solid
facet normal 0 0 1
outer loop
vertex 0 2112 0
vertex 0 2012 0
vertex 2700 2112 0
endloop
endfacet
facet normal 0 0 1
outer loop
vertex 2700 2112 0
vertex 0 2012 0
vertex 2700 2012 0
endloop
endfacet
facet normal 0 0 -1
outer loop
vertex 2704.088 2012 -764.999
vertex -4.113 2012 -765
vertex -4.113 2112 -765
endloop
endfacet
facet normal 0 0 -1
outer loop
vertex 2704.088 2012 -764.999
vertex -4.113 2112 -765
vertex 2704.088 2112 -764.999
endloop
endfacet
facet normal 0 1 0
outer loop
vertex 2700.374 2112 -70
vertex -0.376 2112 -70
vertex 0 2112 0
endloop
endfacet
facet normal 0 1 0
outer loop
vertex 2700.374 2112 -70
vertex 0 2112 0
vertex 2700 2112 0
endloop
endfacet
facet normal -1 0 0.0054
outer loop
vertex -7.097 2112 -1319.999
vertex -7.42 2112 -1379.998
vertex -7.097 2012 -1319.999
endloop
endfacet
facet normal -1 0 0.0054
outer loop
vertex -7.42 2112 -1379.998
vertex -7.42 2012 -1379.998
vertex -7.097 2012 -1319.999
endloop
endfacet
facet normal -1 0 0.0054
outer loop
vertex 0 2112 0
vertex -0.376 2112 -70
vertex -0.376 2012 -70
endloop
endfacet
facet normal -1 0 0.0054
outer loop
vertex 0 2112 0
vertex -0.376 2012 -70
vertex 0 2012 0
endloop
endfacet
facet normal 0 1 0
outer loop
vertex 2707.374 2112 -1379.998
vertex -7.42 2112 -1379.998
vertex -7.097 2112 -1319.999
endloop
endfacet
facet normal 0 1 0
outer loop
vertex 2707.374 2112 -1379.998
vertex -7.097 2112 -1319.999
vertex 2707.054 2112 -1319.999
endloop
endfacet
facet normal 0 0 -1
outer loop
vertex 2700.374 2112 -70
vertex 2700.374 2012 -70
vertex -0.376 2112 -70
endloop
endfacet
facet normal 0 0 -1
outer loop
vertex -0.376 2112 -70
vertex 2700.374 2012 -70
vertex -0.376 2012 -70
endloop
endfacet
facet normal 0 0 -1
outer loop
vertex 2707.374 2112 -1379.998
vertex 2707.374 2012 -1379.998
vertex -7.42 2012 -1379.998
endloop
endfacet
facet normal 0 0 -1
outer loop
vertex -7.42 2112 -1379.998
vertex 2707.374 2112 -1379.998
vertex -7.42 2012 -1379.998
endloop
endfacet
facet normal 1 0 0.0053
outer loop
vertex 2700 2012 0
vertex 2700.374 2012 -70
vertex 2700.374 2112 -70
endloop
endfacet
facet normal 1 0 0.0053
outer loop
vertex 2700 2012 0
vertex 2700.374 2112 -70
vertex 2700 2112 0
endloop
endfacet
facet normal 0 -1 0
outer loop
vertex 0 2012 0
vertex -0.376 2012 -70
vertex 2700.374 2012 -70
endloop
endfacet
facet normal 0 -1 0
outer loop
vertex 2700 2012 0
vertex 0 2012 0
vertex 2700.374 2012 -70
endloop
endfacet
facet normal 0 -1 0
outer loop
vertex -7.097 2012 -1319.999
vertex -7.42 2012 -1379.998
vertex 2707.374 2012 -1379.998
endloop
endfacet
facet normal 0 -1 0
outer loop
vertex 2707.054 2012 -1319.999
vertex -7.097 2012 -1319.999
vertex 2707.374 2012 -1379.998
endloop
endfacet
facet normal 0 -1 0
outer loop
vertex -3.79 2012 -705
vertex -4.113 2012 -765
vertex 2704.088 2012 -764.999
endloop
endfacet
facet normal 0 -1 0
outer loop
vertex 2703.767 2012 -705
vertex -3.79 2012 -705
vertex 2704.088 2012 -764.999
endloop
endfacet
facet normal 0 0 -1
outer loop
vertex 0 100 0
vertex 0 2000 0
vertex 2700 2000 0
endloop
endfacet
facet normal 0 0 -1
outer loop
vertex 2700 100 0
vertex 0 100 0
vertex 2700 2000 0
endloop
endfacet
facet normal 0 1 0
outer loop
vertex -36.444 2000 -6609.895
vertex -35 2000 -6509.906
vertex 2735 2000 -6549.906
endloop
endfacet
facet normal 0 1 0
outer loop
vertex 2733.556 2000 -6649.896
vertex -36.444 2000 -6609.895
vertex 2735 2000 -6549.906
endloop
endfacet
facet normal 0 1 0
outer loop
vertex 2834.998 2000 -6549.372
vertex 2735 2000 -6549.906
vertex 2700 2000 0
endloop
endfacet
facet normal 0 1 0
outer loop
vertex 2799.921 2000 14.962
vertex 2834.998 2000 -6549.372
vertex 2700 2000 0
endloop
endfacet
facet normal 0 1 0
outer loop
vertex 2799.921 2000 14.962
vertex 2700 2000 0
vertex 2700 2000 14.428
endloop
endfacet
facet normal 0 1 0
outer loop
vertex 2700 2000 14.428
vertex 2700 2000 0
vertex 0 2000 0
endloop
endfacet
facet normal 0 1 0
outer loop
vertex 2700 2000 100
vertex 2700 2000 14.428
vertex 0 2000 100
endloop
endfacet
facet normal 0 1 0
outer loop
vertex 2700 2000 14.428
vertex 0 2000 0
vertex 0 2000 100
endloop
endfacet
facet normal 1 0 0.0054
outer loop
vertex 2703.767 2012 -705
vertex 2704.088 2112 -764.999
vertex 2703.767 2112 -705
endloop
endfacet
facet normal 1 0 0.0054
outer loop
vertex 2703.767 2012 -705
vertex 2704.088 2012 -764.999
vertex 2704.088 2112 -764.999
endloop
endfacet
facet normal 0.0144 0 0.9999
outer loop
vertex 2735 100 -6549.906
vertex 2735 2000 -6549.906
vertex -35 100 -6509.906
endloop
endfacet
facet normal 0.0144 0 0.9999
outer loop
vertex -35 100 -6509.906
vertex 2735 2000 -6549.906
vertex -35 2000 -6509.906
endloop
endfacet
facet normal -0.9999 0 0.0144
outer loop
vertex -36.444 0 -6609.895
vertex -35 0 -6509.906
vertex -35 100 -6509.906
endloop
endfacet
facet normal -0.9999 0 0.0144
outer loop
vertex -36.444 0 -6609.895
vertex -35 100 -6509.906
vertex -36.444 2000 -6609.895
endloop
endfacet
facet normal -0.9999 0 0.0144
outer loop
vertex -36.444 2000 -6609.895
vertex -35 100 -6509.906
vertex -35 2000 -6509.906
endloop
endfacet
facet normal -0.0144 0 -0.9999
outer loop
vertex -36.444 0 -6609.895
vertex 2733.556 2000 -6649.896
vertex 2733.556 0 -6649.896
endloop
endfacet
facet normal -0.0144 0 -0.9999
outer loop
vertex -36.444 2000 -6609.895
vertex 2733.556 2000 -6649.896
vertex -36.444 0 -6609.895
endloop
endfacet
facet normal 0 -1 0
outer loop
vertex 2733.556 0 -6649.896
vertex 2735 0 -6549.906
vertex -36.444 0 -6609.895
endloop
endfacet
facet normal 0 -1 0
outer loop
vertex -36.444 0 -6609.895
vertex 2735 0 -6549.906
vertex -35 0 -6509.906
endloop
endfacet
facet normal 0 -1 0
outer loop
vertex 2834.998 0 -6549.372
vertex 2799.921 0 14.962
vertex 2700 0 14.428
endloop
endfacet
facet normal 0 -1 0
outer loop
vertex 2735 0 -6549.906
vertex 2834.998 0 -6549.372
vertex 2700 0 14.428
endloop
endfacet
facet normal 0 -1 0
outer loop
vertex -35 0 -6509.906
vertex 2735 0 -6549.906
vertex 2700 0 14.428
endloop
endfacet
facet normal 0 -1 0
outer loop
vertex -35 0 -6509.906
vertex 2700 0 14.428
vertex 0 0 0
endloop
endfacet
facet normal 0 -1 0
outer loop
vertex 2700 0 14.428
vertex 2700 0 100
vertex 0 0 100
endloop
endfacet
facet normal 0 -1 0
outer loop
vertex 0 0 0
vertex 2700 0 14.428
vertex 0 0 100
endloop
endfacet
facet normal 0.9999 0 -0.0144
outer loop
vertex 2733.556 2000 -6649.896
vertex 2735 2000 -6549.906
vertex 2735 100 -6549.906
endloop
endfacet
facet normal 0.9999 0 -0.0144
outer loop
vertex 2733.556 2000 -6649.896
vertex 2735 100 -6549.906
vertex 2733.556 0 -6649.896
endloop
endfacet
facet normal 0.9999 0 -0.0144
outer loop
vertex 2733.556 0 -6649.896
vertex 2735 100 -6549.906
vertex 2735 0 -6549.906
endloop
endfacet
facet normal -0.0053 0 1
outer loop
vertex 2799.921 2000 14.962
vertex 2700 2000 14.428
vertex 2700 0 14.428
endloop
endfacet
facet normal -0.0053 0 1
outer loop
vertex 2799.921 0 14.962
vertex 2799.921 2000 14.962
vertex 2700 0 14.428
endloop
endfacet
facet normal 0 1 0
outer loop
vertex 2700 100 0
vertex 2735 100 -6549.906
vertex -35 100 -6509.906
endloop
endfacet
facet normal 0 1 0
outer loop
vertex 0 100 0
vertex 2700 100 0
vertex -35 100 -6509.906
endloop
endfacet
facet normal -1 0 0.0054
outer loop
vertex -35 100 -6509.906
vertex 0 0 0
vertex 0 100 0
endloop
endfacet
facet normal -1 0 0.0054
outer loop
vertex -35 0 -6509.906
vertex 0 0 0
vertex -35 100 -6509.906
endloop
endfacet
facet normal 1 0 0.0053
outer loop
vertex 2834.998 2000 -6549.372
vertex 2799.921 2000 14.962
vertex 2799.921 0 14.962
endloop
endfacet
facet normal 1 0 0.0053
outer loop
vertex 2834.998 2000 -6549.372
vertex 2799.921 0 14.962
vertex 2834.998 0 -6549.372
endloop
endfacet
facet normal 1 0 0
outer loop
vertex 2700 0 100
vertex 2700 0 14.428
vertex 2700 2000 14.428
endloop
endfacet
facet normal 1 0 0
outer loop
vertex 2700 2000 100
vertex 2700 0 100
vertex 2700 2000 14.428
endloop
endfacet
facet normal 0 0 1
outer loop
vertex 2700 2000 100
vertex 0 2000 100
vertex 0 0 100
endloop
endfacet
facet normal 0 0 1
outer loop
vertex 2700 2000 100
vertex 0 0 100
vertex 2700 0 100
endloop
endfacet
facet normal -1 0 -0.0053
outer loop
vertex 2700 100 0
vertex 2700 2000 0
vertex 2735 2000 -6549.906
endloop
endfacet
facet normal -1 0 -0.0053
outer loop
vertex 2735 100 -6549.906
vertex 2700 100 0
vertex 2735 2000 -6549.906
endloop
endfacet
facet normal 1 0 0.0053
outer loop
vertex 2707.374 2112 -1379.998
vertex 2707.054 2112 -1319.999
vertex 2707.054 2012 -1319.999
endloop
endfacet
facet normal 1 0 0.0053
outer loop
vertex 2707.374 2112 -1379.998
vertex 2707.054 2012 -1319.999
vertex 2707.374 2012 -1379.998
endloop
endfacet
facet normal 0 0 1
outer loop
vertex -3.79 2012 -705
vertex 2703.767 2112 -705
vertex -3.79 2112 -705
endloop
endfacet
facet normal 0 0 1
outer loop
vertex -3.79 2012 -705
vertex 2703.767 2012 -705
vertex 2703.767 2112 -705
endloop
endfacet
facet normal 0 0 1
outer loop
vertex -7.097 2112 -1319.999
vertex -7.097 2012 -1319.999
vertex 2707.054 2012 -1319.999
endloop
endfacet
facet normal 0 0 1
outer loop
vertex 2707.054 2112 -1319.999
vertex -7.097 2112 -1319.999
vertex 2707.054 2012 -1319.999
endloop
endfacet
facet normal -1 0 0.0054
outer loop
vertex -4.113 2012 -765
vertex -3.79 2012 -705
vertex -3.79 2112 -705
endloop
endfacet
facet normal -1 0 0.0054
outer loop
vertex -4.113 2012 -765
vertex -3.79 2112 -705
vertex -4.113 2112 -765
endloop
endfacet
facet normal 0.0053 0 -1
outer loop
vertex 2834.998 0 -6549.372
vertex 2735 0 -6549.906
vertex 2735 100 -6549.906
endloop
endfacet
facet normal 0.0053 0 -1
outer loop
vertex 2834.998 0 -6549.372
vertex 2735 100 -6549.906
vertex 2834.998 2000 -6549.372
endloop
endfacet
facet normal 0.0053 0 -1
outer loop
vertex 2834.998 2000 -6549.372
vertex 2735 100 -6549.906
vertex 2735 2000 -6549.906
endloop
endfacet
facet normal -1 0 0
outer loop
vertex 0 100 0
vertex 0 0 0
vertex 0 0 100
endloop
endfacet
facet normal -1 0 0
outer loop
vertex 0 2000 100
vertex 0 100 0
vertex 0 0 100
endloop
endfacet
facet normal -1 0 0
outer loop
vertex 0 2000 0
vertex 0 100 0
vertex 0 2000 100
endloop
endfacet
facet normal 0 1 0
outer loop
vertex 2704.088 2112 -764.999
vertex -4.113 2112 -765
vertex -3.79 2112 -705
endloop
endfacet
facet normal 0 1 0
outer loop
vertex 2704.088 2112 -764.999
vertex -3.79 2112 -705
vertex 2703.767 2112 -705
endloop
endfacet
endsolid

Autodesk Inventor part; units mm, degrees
ref_plane "YZ Plane" through (0, 0, 0) normal (1, 0, 0) x (0, 1, 0)
ref_plane "XZ Plane" through (0, 0, 0) normal (0, 1, 0) x (-1, 0, 0)
ref_plane "XY Plane" through (0, 0, 0) normal (0, 0, 1) x (1, 0, 0)
sketch "Skizze1" plane through (0, 0, 0) normal (0, 1, 0) x (-1, 0, 0)
  line L0 (0, 0) -> (35, -6509.9059)
  line L1 (0, 0) -> (-2700, 0)
  line L2 (-2700, 0) -> (-2735, -6549.9065)
  line L3 (-2735, -6549.9065) -> (35, -6509.9059)
  line L4 (-1350, 0) -> (-1350, -6529.9062) construction
  dimension "d0" = 6510
  dimension "d1" = 2700
  dimension "d2" = 6550
  dimension "d3" = 2770
  dimension "d4" = 1350
extrude "Extrusion1" add sketch "Skizze1" along normal blind 100
sketch "Skizze2" plane through (0, 0, 0) normal (0, 0, 1) x (1, 0, 0)
  line L0 (0, 0) -> (0, 100) projected
  line L1 (0, 0) -> (2700, 0)
  line L2 (2700, 0) -> (2700, 2000)
  line L3 (2700, 2000) -> (0, 2000)
  line L4 (0, 2000) -> (0, 0)
  dimension "d7" = 2000
extrude "Extrusion2" add sketch "Skizze2" along normal blind 100
sketch "Skizze3" plane through (2700, 0, 0) normal (0.9999857, 0, 0.0053435) x (0.0053435, 0, -0.9999857)
  line L0 (-14.4275, 0) -> (6550, 0)
  line L1 (6550, 0) -> (6550, 2000)
  line L2 (6550, 2000) -> (-14.4275, 2000)
  line L3 (-14.4275, 2000) -> (-14.4275, 0)
  dimension "d10" = 2000
extrude "Extrusion3" add sketch "Skizze3" along normal blind 100
sketch "Skizze4" plane through (-35, 0, -6509.9059) normal (-0.0144391, 0, -0.9998958) x (-0.9998958, 0, 0.0144391)
  line L0 (-2770.2888, 0) -> (0, 0)
  line L1 (0, 0) -> (0, 2000)
  line L2 (0, 2000) -> (-2770.2888, 2000)
  line L3 (-2770.2888, 2000) -> (-2770.2888, 0)
  line L4 (0, 0) -> (-2770.2888, 0) projected
  point P0 (59.0011, 0)
  dimension "d13" = 2000
extrude "Extrusion4" add sketch "Skizze4" along normal blind 100
ref_plane "Arbeitsebene1" through (0, 2012, 0) normal (0, 1, 0) x (1, 0, 0)
sketch "Skizze5" plane through (0, 2012, 0) normal (0, 1, 0) x (1, 0, 0)
  line L0 (0, 0) -> (2700, 0) projected
  line L1 (0, 0) -> (2700.3741, 0)
  line L2 (2700.3741, 0) -> (2700.3741, 70)
  line L3 (2700.3741, 70) -> (-0.3763, 70)
  line L4 (-0.3763, 70) -> (0, 0)
  line L5 (2735, 6549.9065) -> (2700, 0) projected
  line L6 (-35, 6509.9059) -> (0, 0) projected
  dimension "d17" = 70
extrude "Extrusion5" add sketch "Skizze5" along normal blind 100 contours L4 L3 L5 L0
sketch "Skizze6" plane through (0, 2012, 0) normal (0, 1, 0) x (1, 0, 0)
  line L0 (2703.7672, 705) -> (-3.7904, 705)
  line L1 (-3.7904, 705) -> (-4.113, 765)
  line L2 (-4.113, 765) -> (2704.0878, 764.9991)
  line L3 (2704.0878, 764.9991) -> (2703.7672, 705)
  line L4 (-35, 6509.9059) -> (0, 0) projected
  line L5 (2700.3741, 70) -> (-0.3763, 70) projected
  line L6 (2735, 6549.9065) -> (2700, 0) projected
  dimension "d20" = 635
  dimension "d21" = 60
  dimension "d22" = 60
extrude "Extrusion6" add sketch "Skizze6" along normal blind 100 contours L0 L1 L2 L3
sketch "Skizze7" plane through (0, 2012, 0) normal (0, 1, 0) x (1, 0, 0)
  line L0 (2707.3741, 1379.9983) -> (-7.4195, 1379.9983)
  line L1 (-7.4195, 1379.9983) -> (-7.0969, 1319.9992)
  line L2 (-7.0969, 1319.9992) -> (2707.0535, 1319.9991)
  line L3 (2707.0535, 1319.9991) -> (2707.3741, 1379.9983)
  line L4 (2735, 6549.9065) -> (2700, 0) projected
  line L5 (-35, 6509.9059) -> (0, 0) projected
  line L6 (2704.0878, 764.9991) -> (-4.113, 765) projected
  dimension "d25" = 60
  dimension "d26" = 60
  dimension "d27" = 555
extrude "Extrusion7" add sketch "Skizze7" along normal blind 100 contours L3 L2 L1 L0
sketch "Skizze8" plane through (0, 2012, 0) normal (0, 1, 0) x (1, 0, 0)
  line L0 (2700, 0) -> (2735, 6549.9065) construction
  line L1 (2710.3398, 1934.9983) -> (-10.4034, 1934.9983)
  line L2 (-10.4034, 1934.9983) -> (-10.726, 1994.9983)
  line L3 (-10.726, 1994.9983) -> (2710.6604, 1994.9983)
  line L4 (2710.6604, 1994.9983) -> (2710.3398, 1934.9983)
  line L5 (-35, 6509.9059) -> (0, 0) construction
  line L6 (2707.3741, 1379.9983) -> (-7.4195, 1379.9983) projected
  line L7 (2735, 6549.9065) -> (2733.5561, 6649.8961) projected
  line L8 (2735, 6549.9065) -> (-35, 6509.9059)
  line L9 (-35, 6509.9059) -> (-34.6237, 6439.9059)
  line L10 (-34.6237, 6439.9059) -> (2734.6259, 6479.8938)
  line L11 (2734.6259, 6479.8938) -> (2735, 6549.9065)
  line L12 (2731.1525, 5829.8938) -> (-31.344, 5829.8938)
  line L13 (0, 0) -> (-35, 6509.9059) projected
  line L14 (2730.8319, 5769.8938) -> (-31.0214, 5769.8938)
  dimension "d30" = 60
  dimension "d31" = 60
  dimension "d32" = 555
  dimension "d33" = 70
  dimension "d34" = 70
  dimension "d35" = 60
  dimension "d36" = 60
  dimension "d37" = 650
equation "\"d4\" = 0.5 * d1"
properties part number "Garage"
